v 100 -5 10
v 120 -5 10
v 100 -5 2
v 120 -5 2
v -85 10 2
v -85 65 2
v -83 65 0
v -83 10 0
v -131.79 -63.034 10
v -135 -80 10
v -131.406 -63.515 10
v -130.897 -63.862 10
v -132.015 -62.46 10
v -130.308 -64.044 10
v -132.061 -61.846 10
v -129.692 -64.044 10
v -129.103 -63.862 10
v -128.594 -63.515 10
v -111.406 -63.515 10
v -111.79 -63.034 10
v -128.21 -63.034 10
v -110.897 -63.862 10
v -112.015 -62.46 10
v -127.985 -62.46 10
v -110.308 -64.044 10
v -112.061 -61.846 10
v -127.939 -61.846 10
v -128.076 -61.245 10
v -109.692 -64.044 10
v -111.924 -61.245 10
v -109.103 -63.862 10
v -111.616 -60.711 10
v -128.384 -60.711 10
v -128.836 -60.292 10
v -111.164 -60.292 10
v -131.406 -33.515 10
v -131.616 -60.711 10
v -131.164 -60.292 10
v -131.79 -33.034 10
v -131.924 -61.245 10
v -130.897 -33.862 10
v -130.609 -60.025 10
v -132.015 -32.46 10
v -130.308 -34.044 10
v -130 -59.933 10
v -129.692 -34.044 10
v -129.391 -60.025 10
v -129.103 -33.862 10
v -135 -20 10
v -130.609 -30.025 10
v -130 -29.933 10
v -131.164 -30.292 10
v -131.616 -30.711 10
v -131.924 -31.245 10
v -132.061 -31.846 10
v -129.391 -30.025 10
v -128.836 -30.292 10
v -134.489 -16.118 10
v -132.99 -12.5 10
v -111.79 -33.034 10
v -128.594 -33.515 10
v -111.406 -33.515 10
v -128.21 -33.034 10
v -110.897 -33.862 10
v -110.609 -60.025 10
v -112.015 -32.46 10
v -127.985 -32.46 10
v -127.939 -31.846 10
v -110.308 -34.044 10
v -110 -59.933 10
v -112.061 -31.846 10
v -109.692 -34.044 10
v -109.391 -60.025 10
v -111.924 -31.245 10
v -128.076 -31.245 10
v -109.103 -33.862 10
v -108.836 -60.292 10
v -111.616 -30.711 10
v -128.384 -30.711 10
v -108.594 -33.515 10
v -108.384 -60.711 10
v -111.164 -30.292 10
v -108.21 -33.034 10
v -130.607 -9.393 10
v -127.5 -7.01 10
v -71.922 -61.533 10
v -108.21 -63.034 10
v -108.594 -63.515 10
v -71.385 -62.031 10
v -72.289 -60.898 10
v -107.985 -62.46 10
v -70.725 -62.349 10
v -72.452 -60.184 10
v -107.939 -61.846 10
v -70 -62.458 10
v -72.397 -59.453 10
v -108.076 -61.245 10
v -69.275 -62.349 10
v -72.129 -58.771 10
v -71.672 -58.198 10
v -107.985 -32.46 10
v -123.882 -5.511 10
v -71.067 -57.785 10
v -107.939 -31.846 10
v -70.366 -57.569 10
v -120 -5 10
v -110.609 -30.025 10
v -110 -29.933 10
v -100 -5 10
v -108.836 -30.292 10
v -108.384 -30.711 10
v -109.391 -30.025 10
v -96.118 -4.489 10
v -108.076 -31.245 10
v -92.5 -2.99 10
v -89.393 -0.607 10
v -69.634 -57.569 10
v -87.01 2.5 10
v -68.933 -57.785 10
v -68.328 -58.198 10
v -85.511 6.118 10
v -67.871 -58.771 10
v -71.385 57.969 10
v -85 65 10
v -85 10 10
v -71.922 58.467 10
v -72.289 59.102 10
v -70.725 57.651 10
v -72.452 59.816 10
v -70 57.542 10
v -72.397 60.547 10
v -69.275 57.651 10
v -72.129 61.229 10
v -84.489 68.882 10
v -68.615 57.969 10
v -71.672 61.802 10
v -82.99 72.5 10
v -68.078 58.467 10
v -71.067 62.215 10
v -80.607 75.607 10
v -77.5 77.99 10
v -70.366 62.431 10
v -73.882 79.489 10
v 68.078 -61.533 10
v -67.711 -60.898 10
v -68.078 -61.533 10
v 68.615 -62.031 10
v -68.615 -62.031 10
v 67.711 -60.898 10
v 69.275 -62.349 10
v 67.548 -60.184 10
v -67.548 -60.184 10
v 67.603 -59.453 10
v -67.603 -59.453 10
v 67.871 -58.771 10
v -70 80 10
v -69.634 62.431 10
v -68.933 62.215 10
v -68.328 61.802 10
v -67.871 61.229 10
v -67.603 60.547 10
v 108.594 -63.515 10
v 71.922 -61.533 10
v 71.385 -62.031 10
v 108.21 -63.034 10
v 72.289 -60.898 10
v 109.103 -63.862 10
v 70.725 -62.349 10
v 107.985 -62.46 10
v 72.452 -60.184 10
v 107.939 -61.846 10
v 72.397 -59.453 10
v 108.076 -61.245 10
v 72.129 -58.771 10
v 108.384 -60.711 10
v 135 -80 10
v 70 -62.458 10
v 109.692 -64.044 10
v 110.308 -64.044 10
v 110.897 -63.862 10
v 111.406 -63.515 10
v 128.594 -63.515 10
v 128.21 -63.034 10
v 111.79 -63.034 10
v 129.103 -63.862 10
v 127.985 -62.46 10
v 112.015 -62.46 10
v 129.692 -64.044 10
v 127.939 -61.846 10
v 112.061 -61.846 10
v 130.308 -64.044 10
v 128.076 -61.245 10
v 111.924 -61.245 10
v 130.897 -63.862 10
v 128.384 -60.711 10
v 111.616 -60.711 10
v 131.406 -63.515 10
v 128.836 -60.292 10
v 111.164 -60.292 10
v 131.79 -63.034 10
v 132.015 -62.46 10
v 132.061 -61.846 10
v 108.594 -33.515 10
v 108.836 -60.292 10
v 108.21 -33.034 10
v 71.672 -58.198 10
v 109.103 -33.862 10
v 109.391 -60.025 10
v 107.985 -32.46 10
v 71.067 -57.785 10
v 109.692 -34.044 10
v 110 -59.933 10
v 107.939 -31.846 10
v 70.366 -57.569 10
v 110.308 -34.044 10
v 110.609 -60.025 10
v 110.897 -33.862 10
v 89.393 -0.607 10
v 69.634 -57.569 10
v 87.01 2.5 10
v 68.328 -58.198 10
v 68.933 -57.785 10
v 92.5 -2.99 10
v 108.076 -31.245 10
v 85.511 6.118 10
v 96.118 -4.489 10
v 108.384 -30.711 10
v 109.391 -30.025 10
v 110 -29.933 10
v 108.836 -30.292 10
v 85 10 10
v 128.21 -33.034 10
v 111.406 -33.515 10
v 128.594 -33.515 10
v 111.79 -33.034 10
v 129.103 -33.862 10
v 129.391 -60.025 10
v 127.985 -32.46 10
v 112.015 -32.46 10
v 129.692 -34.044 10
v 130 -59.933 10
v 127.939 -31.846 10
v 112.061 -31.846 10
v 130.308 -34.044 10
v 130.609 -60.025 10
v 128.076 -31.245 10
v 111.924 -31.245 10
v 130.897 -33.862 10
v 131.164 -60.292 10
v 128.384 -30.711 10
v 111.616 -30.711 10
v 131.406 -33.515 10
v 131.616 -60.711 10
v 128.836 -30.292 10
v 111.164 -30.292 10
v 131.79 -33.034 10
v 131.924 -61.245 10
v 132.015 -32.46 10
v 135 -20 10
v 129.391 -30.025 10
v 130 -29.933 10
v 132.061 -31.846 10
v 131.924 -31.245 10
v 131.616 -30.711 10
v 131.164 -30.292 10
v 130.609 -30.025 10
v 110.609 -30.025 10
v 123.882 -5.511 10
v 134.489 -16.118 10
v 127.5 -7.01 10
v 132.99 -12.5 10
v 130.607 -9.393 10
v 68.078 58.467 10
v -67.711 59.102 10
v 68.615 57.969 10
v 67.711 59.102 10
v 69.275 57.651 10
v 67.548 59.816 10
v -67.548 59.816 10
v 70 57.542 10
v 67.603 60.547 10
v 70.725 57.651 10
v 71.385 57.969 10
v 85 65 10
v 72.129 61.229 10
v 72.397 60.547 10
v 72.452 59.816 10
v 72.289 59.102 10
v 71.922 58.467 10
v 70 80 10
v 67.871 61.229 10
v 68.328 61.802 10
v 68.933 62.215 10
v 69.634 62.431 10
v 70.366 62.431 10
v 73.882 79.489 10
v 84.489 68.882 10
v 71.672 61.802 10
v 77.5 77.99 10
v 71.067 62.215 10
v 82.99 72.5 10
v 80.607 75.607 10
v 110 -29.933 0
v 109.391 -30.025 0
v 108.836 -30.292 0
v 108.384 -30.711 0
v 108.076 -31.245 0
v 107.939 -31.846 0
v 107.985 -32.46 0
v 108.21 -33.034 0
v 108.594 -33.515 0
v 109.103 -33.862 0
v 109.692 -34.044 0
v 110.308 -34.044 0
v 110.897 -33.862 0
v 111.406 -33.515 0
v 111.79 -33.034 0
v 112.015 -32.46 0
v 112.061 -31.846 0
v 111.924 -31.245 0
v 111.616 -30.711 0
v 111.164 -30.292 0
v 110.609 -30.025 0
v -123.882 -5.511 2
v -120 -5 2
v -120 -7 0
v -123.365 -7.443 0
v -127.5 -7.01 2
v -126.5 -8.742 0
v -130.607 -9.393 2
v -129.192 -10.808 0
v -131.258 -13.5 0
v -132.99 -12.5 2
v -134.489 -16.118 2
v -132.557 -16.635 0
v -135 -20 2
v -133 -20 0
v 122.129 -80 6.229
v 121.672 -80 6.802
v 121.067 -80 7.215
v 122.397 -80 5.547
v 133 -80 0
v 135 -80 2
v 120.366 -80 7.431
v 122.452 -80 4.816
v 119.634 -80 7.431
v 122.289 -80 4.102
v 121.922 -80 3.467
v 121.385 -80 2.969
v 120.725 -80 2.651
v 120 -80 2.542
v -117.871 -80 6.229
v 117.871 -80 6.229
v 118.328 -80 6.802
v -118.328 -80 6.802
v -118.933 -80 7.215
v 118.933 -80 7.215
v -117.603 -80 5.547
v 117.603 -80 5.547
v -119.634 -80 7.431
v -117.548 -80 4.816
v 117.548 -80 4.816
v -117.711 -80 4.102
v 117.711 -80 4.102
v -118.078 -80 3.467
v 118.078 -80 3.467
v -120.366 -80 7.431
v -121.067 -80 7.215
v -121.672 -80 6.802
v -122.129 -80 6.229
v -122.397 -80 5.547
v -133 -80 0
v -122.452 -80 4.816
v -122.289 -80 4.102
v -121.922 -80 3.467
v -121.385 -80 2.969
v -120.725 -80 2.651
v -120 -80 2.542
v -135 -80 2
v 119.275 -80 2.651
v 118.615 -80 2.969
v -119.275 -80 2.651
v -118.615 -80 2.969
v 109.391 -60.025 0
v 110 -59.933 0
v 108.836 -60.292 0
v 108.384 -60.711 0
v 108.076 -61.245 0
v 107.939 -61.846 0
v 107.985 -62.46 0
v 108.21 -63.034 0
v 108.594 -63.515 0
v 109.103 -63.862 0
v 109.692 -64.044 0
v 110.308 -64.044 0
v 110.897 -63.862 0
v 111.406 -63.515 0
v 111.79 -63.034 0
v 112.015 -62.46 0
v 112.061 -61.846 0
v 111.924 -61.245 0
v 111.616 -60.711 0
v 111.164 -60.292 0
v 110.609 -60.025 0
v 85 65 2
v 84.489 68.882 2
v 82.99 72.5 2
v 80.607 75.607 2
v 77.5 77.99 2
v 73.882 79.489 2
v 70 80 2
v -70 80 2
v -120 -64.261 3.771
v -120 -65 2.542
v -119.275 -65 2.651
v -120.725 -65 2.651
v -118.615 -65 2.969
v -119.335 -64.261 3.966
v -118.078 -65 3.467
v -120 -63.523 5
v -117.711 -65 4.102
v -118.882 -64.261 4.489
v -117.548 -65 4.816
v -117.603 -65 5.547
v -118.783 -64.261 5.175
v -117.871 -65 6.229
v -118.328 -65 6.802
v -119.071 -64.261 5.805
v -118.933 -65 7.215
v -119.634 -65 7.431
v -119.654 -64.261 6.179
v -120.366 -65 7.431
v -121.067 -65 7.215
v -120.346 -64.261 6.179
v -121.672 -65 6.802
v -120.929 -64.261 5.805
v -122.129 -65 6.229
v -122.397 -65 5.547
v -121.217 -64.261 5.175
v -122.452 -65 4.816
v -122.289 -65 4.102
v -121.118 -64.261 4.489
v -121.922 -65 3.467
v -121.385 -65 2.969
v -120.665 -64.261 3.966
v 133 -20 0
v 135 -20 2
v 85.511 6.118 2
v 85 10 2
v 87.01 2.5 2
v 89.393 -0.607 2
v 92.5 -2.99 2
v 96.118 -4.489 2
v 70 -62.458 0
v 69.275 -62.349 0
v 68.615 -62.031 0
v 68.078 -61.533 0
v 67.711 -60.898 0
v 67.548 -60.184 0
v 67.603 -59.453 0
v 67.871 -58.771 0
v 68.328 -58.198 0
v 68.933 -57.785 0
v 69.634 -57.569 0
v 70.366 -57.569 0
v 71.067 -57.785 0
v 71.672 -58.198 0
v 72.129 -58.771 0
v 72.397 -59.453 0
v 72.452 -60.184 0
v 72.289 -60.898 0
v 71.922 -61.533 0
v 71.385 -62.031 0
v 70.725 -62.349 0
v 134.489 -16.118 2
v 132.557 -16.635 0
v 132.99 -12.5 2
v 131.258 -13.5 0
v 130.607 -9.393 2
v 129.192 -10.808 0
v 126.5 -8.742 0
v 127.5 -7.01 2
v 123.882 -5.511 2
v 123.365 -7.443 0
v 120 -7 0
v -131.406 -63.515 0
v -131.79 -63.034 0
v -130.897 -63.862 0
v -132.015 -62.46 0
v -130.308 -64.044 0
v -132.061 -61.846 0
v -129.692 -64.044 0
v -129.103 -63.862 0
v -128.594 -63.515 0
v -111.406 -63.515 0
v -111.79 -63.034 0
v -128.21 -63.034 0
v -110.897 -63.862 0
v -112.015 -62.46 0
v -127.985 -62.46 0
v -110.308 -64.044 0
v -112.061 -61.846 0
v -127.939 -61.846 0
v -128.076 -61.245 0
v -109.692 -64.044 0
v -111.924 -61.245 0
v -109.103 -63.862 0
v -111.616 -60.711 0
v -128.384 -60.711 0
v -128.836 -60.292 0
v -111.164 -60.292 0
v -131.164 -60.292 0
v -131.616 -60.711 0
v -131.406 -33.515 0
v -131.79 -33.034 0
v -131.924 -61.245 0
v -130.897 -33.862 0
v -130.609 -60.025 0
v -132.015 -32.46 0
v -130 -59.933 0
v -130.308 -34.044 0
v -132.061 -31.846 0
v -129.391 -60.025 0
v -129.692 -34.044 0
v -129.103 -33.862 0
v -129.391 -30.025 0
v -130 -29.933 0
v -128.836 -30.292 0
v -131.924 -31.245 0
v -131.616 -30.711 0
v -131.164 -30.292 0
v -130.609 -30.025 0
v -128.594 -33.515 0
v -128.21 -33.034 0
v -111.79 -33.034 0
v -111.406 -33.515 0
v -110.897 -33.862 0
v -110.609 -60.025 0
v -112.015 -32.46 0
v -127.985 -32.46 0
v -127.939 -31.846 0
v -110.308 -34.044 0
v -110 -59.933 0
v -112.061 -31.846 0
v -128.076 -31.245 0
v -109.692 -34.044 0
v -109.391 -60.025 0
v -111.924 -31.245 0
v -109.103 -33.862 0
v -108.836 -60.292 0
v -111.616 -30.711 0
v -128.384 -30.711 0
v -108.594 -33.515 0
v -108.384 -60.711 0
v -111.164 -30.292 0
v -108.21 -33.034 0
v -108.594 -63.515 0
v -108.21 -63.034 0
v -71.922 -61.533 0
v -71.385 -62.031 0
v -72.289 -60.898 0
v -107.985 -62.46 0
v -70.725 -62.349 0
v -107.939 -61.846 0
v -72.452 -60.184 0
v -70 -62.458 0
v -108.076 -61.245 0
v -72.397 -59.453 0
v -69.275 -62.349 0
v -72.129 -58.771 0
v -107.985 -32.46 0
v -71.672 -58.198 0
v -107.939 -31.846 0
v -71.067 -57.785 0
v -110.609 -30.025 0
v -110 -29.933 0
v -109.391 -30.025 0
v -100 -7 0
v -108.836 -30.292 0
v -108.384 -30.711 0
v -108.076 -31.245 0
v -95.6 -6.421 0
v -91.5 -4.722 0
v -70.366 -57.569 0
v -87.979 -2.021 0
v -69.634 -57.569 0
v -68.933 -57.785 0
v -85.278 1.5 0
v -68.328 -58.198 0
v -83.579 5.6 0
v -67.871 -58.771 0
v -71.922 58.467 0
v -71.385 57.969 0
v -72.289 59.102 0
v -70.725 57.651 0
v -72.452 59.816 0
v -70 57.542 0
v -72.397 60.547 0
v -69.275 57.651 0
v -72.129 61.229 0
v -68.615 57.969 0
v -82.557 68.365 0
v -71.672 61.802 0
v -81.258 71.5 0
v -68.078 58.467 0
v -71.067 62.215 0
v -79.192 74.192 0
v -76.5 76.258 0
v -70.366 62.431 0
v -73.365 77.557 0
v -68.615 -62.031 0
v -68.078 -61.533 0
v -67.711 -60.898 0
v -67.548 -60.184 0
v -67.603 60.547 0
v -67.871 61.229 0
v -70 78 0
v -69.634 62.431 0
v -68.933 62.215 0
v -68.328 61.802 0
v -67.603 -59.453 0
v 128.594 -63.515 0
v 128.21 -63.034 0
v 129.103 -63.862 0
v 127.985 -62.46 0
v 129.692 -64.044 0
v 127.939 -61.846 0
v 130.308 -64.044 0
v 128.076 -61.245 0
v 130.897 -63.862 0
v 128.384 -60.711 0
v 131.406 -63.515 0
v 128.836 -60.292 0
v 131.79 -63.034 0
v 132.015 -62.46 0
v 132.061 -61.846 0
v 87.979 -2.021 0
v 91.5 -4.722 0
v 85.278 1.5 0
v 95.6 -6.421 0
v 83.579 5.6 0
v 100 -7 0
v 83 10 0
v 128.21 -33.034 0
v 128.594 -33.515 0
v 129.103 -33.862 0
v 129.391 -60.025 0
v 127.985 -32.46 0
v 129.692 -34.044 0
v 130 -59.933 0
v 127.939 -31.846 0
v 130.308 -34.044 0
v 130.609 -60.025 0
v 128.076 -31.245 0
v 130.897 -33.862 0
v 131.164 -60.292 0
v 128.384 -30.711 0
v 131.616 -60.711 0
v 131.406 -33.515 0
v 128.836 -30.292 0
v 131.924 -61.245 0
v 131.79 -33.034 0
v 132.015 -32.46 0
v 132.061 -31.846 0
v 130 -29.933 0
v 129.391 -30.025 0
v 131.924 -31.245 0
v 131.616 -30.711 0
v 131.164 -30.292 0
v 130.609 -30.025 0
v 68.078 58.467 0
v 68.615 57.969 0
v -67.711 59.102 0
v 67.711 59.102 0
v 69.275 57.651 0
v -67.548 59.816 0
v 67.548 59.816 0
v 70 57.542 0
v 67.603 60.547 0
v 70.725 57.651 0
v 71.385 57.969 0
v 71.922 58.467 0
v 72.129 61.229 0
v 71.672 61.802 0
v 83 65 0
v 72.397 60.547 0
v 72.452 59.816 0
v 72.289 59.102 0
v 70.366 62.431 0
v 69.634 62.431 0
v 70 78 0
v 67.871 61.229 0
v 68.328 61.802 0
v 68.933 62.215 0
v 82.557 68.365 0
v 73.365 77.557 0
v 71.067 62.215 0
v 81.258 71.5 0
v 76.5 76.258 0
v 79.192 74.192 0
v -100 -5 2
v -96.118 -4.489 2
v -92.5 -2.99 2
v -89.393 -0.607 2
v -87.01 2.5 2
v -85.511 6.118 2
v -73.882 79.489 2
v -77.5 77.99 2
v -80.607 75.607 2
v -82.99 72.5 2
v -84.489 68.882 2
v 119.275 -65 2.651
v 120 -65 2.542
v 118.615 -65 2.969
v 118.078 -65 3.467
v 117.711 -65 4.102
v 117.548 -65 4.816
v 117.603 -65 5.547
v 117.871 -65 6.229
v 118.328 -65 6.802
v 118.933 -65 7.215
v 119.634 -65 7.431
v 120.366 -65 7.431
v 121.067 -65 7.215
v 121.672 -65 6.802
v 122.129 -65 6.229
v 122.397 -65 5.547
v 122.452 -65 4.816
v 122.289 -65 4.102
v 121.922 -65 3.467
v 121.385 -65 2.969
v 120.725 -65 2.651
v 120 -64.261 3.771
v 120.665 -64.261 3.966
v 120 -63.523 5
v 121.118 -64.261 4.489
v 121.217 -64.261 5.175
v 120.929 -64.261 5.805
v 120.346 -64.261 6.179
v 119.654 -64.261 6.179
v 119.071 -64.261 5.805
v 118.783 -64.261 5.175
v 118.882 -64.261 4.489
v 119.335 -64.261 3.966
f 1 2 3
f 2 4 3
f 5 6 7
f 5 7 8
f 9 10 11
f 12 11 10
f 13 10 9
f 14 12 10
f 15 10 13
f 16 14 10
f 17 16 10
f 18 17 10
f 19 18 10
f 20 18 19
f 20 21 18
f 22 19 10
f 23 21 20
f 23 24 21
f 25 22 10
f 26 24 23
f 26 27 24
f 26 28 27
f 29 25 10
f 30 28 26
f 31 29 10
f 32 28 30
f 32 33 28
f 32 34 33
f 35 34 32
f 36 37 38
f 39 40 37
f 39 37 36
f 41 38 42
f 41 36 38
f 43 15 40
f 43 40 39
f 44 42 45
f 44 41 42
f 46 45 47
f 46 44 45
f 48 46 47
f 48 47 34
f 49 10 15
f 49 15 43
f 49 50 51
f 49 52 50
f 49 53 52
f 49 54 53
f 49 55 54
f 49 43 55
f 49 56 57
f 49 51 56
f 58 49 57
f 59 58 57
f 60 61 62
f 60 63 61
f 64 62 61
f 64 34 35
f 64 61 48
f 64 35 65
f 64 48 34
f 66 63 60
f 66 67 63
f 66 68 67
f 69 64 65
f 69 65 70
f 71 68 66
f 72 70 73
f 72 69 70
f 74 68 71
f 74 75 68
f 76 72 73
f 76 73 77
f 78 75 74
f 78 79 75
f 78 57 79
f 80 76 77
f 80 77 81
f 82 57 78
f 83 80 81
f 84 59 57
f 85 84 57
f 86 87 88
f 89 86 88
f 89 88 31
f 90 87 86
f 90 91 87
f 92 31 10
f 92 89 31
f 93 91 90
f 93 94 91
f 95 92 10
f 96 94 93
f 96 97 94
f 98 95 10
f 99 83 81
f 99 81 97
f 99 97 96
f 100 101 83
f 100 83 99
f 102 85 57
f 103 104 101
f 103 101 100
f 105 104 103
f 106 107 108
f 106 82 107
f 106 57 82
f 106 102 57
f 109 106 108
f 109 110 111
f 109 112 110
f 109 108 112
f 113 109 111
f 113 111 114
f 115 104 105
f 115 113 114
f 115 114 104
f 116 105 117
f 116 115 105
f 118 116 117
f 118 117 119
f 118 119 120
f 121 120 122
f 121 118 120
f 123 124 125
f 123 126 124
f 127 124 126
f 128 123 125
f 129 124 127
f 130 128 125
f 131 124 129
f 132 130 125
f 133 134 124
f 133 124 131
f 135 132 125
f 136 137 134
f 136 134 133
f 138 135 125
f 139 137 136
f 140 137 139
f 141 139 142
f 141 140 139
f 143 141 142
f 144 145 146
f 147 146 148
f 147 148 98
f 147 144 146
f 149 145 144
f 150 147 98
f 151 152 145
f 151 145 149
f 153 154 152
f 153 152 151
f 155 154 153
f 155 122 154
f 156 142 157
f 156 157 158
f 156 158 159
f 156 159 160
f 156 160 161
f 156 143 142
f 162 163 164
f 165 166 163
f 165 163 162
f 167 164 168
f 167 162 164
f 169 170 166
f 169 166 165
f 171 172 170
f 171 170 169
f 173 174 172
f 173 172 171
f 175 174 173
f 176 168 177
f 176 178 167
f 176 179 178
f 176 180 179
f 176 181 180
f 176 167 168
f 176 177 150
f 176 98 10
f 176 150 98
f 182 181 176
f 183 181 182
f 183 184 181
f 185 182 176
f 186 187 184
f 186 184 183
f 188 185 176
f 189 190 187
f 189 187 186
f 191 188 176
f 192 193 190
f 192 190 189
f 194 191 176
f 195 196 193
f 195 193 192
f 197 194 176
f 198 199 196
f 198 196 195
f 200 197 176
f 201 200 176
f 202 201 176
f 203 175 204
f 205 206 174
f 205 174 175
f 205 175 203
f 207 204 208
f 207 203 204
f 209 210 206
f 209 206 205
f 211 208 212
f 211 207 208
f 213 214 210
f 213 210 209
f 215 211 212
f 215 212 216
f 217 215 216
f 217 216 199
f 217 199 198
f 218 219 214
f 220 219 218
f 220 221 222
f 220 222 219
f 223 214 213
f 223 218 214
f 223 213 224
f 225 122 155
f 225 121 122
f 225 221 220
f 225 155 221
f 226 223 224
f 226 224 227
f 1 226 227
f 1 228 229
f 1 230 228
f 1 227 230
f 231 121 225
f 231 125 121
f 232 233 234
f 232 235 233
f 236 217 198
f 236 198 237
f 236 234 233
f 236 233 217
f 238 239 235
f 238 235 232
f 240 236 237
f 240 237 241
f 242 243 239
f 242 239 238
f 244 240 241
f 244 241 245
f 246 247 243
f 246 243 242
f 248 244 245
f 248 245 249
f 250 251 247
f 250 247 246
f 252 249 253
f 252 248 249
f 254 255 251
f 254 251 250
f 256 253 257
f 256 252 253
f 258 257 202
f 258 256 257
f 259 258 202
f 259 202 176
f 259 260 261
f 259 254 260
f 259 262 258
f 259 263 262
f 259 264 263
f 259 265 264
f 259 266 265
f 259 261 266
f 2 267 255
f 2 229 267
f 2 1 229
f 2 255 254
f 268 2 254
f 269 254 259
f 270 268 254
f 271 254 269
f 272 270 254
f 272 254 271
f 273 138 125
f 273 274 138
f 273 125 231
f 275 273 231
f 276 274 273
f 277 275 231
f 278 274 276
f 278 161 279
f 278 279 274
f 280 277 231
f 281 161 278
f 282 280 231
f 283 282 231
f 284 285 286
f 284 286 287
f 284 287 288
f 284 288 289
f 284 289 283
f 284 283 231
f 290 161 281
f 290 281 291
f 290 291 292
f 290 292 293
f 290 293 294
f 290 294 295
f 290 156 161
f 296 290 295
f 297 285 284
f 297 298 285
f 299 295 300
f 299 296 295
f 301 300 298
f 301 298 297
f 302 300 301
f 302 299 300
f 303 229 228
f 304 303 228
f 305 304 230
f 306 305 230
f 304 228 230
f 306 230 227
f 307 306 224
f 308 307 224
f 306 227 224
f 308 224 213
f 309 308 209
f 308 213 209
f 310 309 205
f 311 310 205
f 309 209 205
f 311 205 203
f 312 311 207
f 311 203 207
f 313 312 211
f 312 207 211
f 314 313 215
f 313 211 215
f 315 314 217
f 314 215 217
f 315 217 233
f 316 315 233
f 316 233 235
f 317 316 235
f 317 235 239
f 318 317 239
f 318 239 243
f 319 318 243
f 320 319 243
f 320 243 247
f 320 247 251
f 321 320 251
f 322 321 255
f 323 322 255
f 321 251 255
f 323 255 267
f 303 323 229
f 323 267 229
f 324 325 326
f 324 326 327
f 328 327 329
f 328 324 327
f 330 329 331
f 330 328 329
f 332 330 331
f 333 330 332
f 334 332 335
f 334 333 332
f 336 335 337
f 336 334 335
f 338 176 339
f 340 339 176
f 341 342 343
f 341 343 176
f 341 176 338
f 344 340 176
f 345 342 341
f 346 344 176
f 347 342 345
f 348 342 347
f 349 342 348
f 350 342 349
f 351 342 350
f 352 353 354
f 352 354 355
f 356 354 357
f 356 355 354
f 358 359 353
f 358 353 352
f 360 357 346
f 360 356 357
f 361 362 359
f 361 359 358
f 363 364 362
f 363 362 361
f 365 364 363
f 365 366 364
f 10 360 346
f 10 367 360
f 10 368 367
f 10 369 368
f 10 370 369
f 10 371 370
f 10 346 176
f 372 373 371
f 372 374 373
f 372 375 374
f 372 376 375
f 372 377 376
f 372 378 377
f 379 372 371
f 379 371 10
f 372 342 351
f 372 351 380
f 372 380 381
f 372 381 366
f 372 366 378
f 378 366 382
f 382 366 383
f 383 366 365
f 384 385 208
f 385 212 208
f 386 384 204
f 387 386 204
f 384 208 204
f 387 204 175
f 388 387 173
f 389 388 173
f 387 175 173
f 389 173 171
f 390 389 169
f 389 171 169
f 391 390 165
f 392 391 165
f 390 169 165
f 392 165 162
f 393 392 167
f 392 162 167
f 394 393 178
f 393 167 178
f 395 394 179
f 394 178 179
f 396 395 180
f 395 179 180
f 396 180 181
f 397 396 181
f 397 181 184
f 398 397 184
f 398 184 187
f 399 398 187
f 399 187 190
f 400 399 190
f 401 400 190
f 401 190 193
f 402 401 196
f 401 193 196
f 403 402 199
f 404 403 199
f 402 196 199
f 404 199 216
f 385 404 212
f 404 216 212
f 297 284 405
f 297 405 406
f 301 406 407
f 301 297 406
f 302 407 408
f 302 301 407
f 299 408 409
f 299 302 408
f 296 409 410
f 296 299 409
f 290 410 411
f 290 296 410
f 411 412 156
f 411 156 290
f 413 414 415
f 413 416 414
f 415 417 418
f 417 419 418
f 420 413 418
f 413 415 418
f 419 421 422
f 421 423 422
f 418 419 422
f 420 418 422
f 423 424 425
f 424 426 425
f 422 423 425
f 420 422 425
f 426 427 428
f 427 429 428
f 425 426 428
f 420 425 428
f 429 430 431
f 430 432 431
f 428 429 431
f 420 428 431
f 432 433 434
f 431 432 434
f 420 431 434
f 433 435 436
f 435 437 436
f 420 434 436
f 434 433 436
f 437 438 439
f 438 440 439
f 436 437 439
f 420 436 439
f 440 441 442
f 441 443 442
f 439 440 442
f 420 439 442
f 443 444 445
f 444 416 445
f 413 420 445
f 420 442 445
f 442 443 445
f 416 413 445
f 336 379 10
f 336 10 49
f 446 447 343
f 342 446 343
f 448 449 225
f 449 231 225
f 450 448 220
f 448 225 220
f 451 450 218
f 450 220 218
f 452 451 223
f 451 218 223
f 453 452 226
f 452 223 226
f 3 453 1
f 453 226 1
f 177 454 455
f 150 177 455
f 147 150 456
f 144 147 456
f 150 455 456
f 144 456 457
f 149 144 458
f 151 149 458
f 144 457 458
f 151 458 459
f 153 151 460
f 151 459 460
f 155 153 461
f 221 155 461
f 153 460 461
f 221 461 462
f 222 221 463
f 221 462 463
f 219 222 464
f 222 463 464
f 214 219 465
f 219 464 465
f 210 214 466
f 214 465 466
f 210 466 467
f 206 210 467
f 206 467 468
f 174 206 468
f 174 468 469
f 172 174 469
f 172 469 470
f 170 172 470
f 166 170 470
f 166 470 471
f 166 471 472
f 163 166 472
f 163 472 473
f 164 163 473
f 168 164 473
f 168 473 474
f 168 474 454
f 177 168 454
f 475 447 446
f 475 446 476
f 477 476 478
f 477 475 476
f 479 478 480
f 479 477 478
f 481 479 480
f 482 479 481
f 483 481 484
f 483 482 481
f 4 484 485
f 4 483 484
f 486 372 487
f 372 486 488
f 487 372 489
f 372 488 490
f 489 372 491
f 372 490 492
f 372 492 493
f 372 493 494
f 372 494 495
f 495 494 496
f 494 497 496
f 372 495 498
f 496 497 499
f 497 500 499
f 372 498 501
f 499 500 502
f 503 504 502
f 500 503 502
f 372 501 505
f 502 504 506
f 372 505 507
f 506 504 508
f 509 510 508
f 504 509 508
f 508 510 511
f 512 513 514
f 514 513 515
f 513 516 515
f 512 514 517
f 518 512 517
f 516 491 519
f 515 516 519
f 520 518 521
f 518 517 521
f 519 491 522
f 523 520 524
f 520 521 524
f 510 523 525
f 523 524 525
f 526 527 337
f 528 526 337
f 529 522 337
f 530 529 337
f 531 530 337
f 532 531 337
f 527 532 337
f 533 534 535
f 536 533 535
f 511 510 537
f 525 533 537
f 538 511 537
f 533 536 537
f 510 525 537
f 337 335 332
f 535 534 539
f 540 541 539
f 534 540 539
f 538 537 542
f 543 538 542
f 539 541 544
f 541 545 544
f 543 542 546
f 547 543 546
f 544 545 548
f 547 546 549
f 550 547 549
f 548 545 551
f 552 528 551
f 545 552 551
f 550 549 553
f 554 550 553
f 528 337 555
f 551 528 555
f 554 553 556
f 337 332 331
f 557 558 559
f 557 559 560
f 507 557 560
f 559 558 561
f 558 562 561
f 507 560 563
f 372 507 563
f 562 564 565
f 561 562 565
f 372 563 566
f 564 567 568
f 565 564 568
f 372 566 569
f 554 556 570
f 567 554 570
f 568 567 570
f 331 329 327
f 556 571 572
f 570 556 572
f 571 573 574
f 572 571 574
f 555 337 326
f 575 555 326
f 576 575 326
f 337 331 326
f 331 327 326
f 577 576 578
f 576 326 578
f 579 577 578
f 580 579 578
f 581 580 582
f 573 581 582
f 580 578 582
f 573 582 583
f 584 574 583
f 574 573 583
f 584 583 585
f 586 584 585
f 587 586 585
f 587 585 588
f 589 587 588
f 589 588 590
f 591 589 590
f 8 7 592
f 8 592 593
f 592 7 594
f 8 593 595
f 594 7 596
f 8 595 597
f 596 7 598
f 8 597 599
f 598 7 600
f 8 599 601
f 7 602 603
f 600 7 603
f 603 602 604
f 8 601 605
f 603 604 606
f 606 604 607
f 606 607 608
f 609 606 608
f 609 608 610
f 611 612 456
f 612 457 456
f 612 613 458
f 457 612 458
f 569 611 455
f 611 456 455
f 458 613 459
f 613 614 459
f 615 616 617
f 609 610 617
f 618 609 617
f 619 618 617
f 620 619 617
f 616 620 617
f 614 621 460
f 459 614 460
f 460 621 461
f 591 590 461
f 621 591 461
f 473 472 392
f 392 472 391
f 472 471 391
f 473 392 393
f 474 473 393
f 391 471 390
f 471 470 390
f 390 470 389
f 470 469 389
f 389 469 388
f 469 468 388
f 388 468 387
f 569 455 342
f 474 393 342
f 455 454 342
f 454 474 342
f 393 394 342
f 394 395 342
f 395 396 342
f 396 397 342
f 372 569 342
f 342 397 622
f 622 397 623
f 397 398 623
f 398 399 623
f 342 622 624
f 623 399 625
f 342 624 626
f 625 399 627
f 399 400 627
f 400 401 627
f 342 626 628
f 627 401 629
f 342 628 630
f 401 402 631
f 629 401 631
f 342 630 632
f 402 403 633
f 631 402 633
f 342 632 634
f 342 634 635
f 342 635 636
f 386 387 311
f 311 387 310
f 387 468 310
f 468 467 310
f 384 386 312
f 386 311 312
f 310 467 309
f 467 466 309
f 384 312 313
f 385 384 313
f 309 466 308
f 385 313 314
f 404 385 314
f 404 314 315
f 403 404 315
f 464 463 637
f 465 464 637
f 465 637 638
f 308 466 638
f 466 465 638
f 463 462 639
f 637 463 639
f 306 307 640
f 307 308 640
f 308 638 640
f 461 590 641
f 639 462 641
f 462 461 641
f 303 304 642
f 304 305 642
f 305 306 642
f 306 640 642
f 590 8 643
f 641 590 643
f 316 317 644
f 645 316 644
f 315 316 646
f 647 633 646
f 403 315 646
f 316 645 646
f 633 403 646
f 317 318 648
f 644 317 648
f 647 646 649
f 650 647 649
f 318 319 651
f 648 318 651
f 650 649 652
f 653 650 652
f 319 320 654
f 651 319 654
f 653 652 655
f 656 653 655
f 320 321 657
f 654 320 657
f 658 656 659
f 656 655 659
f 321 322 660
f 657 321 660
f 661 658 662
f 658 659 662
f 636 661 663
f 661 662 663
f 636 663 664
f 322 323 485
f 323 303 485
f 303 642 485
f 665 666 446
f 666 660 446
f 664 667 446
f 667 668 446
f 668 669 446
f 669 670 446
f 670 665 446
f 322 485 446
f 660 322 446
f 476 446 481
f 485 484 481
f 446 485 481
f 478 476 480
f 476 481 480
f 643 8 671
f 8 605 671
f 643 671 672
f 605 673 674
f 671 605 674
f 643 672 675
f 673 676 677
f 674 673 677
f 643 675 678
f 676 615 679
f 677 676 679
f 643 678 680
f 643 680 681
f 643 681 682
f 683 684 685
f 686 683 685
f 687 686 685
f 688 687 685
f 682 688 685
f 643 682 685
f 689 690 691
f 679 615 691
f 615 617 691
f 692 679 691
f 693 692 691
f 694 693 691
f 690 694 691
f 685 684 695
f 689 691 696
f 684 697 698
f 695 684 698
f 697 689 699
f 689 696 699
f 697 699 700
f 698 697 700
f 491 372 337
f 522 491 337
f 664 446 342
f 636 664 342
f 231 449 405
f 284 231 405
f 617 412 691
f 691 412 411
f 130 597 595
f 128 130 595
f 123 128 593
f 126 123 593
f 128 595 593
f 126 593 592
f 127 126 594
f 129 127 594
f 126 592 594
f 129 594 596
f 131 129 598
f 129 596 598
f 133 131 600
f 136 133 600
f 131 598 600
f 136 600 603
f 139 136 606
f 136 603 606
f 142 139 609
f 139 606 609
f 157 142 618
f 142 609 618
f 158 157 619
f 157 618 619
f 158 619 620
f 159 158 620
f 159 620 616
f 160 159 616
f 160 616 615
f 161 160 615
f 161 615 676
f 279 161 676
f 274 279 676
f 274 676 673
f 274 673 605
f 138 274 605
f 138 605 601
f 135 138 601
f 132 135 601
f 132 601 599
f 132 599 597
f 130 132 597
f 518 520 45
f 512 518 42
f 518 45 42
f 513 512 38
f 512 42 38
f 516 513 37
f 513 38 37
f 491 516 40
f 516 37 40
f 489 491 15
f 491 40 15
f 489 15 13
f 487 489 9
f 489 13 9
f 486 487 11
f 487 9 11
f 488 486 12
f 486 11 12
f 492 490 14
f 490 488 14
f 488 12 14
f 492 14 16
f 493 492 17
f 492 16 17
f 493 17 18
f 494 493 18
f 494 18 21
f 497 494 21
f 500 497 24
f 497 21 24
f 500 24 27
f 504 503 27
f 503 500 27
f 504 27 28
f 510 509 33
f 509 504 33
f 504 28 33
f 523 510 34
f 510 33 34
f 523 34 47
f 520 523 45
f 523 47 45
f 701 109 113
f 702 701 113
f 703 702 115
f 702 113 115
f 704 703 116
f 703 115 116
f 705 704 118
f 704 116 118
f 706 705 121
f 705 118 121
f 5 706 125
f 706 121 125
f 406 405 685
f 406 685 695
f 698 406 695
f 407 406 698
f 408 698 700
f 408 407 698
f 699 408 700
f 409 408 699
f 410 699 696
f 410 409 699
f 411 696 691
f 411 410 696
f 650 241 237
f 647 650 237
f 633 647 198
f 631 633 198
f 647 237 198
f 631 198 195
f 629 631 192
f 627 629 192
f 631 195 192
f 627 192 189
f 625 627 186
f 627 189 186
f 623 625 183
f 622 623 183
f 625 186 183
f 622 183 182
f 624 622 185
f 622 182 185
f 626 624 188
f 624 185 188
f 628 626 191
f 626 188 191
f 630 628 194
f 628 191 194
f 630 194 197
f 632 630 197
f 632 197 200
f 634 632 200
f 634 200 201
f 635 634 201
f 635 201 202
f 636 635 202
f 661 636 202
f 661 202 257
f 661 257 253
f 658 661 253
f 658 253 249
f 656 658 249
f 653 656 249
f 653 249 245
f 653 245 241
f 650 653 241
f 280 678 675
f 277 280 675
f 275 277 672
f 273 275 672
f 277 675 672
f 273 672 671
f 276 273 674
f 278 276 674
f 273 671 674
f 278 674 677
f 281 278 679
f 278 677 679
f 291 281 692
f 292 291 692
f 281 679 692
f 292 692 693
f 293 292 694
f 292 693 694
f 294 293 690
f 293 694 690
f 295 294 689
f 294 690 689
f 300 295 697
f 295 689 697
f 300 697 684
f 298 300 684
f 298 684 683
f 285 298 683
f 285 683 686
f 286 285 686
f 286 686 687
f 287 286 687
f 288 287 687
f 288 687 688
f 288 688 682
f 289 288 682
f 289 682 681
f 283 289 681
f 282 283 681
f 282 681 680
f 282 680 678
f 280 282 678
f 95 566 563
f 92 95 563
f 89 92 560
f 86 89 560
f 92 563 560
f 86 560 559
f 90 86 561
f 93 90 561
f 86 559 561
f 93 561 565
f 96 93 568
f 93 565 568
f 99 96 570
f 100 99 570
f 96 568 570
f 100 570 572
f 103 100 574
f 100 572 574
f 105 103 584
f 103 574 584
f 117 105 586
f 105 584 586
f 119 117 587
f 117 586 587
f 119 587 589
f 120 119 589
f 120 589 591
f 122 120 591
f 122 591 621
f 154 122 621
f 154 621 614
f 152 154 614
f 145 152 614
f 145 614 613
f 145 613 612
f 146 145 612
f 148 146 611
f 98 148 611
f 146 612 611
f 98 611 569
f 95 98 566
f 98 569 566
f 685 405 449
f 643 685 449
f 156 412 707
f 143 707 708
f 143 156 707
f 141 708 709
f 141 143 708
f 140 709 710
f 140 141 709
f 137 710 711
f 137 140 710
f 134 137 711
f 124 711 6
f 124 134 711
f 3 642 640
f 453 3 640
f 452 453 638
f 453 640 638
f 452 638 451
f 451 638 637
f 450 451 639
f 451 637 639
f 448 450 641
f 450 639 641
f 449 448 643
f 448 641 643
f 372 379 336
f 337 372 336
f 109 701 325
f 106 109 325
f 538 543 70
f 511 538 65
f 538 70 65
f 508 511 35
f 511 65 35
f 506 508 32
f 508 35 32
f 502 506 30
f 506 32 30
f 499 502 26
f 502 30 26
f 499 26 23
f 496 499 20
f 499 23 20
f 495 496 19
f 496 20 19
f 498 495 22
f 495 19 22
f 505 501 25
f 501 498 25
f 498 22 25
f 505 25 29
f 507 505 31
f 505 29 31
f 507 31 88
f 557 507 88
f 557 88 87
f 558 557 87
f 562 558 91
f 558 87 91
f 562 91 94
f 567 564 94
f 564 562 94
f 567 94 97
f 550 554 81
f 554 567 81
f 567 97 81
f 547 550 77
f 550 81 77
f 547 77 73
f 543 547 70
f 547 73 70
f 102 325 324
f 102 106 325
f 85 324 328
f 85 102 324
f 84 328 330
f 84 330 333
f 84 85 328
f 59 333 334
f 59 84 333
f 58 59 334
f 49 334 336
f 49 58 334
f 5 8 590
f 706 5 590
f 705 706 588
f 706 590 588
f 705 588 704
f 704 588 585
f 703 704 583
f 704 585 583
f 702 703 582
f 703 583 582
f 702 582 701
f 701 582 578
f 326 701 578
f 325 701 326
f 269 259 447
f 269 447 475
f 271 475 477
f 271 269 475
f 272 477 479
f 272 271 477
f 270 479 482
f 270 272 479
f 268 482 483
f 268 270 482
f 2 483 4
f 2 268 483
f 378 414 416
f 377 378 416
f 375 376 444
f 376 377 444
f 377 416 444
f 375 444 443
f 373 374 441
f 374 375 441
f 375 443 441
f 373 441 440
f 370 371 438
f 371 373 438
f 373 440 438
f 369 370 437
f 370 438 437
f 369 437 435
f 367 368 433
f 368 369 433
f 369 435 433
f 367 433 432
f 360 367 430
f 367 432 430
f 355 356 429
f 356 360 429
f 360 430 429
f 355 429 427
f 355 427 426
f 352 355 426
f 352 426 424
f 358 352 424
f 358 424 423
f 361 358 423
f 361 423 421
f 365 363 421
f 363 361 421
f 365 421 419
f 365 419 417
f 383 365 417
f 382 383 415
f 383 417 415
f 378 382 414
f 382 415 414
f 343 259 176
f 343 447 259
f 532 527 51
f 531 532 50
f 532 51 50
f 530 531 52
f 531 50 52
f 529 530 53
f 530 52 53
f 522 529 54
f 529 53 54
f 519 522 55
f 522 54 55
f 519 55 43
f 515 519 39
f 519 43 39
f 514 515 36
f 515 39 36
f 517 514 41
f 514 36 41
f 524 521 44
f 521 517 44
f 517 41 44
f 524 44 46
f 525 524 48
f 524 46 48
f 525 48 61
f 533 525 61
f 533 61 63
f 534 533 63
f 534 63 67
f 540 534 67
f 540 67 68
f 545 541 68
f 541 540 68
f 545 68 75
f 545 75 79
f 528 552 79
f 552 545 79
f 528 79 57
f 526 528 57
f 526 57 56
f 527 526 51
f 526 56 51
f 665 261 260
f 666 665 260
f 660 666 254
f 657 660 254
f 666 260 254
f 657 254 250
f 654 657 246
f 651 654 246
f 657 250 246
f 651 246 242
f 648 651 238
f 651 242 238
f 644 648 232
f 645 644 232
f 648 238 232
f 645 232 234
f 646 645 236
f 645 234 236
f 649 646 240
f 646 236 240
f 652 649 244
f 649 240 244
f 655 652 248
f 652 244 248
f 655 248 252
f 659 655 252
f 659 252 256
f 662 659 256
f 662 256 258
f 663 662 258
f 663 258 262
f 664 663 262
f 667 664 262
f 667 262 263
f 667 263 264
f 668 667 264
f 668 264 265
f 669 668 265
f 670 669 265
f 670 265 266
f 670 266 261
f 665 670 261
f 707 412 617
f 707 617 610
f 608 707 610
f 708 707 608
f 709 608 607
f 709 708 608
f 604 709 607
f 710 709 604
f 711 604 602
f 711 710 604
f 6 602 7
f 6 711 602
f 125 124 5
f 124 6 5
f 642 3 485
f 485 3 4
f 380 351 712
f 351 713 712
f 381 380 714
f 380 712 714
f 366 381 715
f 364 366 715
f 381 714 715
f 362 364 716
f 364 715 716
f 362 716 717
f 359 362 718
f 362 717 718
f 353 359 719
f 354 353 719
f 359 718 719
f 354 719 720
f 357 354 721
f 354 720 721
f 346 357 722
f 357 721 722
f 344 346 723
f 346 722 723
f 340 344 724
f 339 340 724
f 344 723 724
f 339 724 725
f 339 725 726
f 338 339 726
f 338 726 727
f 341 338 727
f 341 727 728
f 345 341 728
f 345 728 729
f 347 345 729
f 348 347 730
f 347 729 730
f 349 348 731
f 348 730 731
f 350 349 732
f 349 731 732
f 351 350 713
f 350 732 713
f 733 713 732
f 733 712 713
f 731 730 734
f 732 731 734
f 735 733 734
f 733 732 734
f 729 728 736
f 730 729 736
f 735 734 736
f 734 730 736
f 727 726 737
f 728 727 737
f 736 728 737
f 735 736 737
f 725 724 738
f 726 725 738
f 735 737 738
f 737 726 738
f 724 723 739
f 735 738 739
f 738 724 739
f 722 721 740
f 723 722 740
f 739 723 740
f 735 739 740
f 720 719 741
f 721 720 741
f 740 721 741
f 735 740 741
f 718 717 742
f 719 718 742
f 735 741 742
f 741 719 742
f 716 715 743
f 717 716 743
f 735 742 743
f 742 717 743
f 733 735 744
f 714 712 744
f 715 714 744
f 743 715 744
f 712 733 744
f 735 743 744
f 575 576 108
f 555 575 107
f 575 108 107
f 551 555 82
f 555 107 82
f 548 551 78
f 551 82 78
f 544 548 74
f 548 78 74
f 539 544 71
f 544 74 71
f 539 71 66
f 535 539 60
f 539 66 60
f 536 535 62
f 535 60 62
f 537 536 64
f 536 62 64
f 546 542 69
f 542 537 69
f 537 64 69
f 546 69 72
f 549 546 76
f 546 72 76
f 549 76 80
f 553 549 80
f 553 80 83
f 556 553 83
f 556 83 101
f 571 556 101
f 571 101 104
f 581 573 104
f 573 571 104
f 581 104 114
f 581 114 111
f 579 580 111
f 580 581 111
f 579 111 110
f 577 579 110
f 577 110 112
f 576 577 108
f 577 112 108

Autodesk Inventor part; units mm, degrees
ref_plane "YZ Plane" through (0, 0, 0) normal (1, 0, 0) x (0, 1, 0)
ref_plane "XZ Plane" through (0, 0, 0) normal (0, 1, 0) x (-1, 0, 0)
ref_plane "XY Plane" through (0, 0, 0) normal (0, 0, 1) x (1, 0, 0)
sketch "Sketch1" plane through (0, 0, 0) normal (0, 0, 1) x (1, 0, 0)
  line L0 (135, -80) -> (-135, -80)
  line L1 (-135, -80) -> (-135, 80)
  line L2 (-135, 80) -> (135, 80)
  line L3 (135, 80) -> (135, -80)
  line L4 (135, -80) -> (-135, 80) construction
  line L5 (-135, -80) -> (135, 80) construction
  point P0 (0, 0)
  dimension "d0" = 270
  dimension "d1" = 160
extrude "Extrusion1" add sketch "Sketch1" along normal blind 10
sketch "Sketch2" plane through (0, 0, 10) normal (0, 0, 1) x (1, 0, 0)
  line L0 (70, -60) -> (-70, -60) construction
  line L1 (-70, -60) -> (-70, 60) construction
  line L2 (-70, 60) -> (70, 60) construction
  line L3 (70, 60) -> (70, -60) construction
  line L4 (70, -60) -> (-70, 60) construction
  line L5 (-70, -60) -> (70, 60) construction
  point P0 (0, 0)
  dimension "d4" = 140
  dimension "d5" = 120
hole "Hole1" at (-70, 60, 10) at (70, 60, 10) at (-70, -60, 10) at (70, -60, 10) direction (0, 0, -1) diameter 4.917 depth 25 tip angle 118 thread size "M6x1" class "6H" standard "ISO Metric profile"
sketch "Sketch3" plane through (0, 0, 0) normal (0, 0, -1) x (-1, 0, 0)
  line L0 (135, 80) -> (135, -80) construction
  line L1 (135, -80) -> (105, -80) construction
  line L2 (105, -80) -> (105, -20) construction
  line L3 (105, -20) -> (135, -20) construction
  line L4 (135, -20) -> (135, -80) construction
  line L5 (135, 80) -> (85, 80)
  line L6 (85, 80) -> (85, -5)
  line L7 (85, -5) -> (135, -5)
  line L8 (135, -5) -> (135, 80)
  point P0 (0, 0)
  dimension "d15" = 30
  dimension "d16" = 60
  dimension "d17" = 50
  dimension "d21" = 85
extrude "Extrusion2" cut sketch "Sketch3" against normal blind 10
fillet "Fillet2" radius 15 3 edges at (-85, 80, 5) (-85, -5, 5) (-135, -5, 5)
mirror "Mirror1" about plane through (0, 0, 0) normal (1, 0, 0) of "Extrusion2"
mirror "Mirror2" about plane through (0, 0, 0) normal (1, 0, 0) of "Fillet2"
sketch "Sketch4" plane through (0, 0, 0) normal (0, 0, -1) x (-1, 0, 0)
  line L0 (-130, -32) -> (-110, -32) construction
  line L1 (-110, -32) -> (-110, -62) construction
  line L2 (-110, -62) -> (-130, -62) construction
  line L3 (-130, -62) -> (-130, -32) construction
  line L4 (135, -80) -> (-135, -80) construction
  line L5 (-135, -80) -> (-135, -20) construction
  point P0 (0, 0)
  point P1 (-120, -62)
  point P2 (-130, -47)
  dimension "d22" = 20
  dimension "d23" = 30
  dimension "d24" = 18
  dimension "d25" = 5
hole "Hole2" at (130, -32, 0) at (110, -32, 0) at (110, -62, 0) at (130, -62, 0) direction (0, 0, 1) diameter 4.134 end through all thread size "M5x0.8" class "6H" standard "ISO Metric profile"
sketch "Sketch5" plane through (-135, -80, 0) normal (0, -1, 0) x (1, 0, 0)
  line L0 (270, 0) -> (270, 10) projected
  line L1 (0, 0) -> (270, 0) projected
  point P0 (135, 0)
  point P1 (255, 5)
  point P2 (270, 5)
  dimension "d33" = 15
  dimension "d34" = 5
hole "Hole3" at (120, -80, 5) direction (0, 1, 0) diameter 4.917 depth 15 tip angle 118 thread size "M6x1" class "6H" standard "ISO Metric profile"
mirror "Mirror3" about plane through (0, 0, 0) normal (1, 0, 0) of "Hole2", "Hole3"
chamfer "Chamfer2" distance 2 angle 45 13 edges at (-80.6066, 75.6066, 0) (-85, 37.5, 0) (-89.3934, -0.6066, 0) (-110, -5, 0) (-130.6066, -9.3934, 0) (-135, -50, 0) (0, 80, 0) (80.6066, 75.6066, 0) (85, 37.5, 0) (89.3934, -0.6066, 0) (110, -5, 0) (130.6066, -9.3934, 0) (135, -50, 0)
properties part number "Support_lift" material "Stainless Steel"
